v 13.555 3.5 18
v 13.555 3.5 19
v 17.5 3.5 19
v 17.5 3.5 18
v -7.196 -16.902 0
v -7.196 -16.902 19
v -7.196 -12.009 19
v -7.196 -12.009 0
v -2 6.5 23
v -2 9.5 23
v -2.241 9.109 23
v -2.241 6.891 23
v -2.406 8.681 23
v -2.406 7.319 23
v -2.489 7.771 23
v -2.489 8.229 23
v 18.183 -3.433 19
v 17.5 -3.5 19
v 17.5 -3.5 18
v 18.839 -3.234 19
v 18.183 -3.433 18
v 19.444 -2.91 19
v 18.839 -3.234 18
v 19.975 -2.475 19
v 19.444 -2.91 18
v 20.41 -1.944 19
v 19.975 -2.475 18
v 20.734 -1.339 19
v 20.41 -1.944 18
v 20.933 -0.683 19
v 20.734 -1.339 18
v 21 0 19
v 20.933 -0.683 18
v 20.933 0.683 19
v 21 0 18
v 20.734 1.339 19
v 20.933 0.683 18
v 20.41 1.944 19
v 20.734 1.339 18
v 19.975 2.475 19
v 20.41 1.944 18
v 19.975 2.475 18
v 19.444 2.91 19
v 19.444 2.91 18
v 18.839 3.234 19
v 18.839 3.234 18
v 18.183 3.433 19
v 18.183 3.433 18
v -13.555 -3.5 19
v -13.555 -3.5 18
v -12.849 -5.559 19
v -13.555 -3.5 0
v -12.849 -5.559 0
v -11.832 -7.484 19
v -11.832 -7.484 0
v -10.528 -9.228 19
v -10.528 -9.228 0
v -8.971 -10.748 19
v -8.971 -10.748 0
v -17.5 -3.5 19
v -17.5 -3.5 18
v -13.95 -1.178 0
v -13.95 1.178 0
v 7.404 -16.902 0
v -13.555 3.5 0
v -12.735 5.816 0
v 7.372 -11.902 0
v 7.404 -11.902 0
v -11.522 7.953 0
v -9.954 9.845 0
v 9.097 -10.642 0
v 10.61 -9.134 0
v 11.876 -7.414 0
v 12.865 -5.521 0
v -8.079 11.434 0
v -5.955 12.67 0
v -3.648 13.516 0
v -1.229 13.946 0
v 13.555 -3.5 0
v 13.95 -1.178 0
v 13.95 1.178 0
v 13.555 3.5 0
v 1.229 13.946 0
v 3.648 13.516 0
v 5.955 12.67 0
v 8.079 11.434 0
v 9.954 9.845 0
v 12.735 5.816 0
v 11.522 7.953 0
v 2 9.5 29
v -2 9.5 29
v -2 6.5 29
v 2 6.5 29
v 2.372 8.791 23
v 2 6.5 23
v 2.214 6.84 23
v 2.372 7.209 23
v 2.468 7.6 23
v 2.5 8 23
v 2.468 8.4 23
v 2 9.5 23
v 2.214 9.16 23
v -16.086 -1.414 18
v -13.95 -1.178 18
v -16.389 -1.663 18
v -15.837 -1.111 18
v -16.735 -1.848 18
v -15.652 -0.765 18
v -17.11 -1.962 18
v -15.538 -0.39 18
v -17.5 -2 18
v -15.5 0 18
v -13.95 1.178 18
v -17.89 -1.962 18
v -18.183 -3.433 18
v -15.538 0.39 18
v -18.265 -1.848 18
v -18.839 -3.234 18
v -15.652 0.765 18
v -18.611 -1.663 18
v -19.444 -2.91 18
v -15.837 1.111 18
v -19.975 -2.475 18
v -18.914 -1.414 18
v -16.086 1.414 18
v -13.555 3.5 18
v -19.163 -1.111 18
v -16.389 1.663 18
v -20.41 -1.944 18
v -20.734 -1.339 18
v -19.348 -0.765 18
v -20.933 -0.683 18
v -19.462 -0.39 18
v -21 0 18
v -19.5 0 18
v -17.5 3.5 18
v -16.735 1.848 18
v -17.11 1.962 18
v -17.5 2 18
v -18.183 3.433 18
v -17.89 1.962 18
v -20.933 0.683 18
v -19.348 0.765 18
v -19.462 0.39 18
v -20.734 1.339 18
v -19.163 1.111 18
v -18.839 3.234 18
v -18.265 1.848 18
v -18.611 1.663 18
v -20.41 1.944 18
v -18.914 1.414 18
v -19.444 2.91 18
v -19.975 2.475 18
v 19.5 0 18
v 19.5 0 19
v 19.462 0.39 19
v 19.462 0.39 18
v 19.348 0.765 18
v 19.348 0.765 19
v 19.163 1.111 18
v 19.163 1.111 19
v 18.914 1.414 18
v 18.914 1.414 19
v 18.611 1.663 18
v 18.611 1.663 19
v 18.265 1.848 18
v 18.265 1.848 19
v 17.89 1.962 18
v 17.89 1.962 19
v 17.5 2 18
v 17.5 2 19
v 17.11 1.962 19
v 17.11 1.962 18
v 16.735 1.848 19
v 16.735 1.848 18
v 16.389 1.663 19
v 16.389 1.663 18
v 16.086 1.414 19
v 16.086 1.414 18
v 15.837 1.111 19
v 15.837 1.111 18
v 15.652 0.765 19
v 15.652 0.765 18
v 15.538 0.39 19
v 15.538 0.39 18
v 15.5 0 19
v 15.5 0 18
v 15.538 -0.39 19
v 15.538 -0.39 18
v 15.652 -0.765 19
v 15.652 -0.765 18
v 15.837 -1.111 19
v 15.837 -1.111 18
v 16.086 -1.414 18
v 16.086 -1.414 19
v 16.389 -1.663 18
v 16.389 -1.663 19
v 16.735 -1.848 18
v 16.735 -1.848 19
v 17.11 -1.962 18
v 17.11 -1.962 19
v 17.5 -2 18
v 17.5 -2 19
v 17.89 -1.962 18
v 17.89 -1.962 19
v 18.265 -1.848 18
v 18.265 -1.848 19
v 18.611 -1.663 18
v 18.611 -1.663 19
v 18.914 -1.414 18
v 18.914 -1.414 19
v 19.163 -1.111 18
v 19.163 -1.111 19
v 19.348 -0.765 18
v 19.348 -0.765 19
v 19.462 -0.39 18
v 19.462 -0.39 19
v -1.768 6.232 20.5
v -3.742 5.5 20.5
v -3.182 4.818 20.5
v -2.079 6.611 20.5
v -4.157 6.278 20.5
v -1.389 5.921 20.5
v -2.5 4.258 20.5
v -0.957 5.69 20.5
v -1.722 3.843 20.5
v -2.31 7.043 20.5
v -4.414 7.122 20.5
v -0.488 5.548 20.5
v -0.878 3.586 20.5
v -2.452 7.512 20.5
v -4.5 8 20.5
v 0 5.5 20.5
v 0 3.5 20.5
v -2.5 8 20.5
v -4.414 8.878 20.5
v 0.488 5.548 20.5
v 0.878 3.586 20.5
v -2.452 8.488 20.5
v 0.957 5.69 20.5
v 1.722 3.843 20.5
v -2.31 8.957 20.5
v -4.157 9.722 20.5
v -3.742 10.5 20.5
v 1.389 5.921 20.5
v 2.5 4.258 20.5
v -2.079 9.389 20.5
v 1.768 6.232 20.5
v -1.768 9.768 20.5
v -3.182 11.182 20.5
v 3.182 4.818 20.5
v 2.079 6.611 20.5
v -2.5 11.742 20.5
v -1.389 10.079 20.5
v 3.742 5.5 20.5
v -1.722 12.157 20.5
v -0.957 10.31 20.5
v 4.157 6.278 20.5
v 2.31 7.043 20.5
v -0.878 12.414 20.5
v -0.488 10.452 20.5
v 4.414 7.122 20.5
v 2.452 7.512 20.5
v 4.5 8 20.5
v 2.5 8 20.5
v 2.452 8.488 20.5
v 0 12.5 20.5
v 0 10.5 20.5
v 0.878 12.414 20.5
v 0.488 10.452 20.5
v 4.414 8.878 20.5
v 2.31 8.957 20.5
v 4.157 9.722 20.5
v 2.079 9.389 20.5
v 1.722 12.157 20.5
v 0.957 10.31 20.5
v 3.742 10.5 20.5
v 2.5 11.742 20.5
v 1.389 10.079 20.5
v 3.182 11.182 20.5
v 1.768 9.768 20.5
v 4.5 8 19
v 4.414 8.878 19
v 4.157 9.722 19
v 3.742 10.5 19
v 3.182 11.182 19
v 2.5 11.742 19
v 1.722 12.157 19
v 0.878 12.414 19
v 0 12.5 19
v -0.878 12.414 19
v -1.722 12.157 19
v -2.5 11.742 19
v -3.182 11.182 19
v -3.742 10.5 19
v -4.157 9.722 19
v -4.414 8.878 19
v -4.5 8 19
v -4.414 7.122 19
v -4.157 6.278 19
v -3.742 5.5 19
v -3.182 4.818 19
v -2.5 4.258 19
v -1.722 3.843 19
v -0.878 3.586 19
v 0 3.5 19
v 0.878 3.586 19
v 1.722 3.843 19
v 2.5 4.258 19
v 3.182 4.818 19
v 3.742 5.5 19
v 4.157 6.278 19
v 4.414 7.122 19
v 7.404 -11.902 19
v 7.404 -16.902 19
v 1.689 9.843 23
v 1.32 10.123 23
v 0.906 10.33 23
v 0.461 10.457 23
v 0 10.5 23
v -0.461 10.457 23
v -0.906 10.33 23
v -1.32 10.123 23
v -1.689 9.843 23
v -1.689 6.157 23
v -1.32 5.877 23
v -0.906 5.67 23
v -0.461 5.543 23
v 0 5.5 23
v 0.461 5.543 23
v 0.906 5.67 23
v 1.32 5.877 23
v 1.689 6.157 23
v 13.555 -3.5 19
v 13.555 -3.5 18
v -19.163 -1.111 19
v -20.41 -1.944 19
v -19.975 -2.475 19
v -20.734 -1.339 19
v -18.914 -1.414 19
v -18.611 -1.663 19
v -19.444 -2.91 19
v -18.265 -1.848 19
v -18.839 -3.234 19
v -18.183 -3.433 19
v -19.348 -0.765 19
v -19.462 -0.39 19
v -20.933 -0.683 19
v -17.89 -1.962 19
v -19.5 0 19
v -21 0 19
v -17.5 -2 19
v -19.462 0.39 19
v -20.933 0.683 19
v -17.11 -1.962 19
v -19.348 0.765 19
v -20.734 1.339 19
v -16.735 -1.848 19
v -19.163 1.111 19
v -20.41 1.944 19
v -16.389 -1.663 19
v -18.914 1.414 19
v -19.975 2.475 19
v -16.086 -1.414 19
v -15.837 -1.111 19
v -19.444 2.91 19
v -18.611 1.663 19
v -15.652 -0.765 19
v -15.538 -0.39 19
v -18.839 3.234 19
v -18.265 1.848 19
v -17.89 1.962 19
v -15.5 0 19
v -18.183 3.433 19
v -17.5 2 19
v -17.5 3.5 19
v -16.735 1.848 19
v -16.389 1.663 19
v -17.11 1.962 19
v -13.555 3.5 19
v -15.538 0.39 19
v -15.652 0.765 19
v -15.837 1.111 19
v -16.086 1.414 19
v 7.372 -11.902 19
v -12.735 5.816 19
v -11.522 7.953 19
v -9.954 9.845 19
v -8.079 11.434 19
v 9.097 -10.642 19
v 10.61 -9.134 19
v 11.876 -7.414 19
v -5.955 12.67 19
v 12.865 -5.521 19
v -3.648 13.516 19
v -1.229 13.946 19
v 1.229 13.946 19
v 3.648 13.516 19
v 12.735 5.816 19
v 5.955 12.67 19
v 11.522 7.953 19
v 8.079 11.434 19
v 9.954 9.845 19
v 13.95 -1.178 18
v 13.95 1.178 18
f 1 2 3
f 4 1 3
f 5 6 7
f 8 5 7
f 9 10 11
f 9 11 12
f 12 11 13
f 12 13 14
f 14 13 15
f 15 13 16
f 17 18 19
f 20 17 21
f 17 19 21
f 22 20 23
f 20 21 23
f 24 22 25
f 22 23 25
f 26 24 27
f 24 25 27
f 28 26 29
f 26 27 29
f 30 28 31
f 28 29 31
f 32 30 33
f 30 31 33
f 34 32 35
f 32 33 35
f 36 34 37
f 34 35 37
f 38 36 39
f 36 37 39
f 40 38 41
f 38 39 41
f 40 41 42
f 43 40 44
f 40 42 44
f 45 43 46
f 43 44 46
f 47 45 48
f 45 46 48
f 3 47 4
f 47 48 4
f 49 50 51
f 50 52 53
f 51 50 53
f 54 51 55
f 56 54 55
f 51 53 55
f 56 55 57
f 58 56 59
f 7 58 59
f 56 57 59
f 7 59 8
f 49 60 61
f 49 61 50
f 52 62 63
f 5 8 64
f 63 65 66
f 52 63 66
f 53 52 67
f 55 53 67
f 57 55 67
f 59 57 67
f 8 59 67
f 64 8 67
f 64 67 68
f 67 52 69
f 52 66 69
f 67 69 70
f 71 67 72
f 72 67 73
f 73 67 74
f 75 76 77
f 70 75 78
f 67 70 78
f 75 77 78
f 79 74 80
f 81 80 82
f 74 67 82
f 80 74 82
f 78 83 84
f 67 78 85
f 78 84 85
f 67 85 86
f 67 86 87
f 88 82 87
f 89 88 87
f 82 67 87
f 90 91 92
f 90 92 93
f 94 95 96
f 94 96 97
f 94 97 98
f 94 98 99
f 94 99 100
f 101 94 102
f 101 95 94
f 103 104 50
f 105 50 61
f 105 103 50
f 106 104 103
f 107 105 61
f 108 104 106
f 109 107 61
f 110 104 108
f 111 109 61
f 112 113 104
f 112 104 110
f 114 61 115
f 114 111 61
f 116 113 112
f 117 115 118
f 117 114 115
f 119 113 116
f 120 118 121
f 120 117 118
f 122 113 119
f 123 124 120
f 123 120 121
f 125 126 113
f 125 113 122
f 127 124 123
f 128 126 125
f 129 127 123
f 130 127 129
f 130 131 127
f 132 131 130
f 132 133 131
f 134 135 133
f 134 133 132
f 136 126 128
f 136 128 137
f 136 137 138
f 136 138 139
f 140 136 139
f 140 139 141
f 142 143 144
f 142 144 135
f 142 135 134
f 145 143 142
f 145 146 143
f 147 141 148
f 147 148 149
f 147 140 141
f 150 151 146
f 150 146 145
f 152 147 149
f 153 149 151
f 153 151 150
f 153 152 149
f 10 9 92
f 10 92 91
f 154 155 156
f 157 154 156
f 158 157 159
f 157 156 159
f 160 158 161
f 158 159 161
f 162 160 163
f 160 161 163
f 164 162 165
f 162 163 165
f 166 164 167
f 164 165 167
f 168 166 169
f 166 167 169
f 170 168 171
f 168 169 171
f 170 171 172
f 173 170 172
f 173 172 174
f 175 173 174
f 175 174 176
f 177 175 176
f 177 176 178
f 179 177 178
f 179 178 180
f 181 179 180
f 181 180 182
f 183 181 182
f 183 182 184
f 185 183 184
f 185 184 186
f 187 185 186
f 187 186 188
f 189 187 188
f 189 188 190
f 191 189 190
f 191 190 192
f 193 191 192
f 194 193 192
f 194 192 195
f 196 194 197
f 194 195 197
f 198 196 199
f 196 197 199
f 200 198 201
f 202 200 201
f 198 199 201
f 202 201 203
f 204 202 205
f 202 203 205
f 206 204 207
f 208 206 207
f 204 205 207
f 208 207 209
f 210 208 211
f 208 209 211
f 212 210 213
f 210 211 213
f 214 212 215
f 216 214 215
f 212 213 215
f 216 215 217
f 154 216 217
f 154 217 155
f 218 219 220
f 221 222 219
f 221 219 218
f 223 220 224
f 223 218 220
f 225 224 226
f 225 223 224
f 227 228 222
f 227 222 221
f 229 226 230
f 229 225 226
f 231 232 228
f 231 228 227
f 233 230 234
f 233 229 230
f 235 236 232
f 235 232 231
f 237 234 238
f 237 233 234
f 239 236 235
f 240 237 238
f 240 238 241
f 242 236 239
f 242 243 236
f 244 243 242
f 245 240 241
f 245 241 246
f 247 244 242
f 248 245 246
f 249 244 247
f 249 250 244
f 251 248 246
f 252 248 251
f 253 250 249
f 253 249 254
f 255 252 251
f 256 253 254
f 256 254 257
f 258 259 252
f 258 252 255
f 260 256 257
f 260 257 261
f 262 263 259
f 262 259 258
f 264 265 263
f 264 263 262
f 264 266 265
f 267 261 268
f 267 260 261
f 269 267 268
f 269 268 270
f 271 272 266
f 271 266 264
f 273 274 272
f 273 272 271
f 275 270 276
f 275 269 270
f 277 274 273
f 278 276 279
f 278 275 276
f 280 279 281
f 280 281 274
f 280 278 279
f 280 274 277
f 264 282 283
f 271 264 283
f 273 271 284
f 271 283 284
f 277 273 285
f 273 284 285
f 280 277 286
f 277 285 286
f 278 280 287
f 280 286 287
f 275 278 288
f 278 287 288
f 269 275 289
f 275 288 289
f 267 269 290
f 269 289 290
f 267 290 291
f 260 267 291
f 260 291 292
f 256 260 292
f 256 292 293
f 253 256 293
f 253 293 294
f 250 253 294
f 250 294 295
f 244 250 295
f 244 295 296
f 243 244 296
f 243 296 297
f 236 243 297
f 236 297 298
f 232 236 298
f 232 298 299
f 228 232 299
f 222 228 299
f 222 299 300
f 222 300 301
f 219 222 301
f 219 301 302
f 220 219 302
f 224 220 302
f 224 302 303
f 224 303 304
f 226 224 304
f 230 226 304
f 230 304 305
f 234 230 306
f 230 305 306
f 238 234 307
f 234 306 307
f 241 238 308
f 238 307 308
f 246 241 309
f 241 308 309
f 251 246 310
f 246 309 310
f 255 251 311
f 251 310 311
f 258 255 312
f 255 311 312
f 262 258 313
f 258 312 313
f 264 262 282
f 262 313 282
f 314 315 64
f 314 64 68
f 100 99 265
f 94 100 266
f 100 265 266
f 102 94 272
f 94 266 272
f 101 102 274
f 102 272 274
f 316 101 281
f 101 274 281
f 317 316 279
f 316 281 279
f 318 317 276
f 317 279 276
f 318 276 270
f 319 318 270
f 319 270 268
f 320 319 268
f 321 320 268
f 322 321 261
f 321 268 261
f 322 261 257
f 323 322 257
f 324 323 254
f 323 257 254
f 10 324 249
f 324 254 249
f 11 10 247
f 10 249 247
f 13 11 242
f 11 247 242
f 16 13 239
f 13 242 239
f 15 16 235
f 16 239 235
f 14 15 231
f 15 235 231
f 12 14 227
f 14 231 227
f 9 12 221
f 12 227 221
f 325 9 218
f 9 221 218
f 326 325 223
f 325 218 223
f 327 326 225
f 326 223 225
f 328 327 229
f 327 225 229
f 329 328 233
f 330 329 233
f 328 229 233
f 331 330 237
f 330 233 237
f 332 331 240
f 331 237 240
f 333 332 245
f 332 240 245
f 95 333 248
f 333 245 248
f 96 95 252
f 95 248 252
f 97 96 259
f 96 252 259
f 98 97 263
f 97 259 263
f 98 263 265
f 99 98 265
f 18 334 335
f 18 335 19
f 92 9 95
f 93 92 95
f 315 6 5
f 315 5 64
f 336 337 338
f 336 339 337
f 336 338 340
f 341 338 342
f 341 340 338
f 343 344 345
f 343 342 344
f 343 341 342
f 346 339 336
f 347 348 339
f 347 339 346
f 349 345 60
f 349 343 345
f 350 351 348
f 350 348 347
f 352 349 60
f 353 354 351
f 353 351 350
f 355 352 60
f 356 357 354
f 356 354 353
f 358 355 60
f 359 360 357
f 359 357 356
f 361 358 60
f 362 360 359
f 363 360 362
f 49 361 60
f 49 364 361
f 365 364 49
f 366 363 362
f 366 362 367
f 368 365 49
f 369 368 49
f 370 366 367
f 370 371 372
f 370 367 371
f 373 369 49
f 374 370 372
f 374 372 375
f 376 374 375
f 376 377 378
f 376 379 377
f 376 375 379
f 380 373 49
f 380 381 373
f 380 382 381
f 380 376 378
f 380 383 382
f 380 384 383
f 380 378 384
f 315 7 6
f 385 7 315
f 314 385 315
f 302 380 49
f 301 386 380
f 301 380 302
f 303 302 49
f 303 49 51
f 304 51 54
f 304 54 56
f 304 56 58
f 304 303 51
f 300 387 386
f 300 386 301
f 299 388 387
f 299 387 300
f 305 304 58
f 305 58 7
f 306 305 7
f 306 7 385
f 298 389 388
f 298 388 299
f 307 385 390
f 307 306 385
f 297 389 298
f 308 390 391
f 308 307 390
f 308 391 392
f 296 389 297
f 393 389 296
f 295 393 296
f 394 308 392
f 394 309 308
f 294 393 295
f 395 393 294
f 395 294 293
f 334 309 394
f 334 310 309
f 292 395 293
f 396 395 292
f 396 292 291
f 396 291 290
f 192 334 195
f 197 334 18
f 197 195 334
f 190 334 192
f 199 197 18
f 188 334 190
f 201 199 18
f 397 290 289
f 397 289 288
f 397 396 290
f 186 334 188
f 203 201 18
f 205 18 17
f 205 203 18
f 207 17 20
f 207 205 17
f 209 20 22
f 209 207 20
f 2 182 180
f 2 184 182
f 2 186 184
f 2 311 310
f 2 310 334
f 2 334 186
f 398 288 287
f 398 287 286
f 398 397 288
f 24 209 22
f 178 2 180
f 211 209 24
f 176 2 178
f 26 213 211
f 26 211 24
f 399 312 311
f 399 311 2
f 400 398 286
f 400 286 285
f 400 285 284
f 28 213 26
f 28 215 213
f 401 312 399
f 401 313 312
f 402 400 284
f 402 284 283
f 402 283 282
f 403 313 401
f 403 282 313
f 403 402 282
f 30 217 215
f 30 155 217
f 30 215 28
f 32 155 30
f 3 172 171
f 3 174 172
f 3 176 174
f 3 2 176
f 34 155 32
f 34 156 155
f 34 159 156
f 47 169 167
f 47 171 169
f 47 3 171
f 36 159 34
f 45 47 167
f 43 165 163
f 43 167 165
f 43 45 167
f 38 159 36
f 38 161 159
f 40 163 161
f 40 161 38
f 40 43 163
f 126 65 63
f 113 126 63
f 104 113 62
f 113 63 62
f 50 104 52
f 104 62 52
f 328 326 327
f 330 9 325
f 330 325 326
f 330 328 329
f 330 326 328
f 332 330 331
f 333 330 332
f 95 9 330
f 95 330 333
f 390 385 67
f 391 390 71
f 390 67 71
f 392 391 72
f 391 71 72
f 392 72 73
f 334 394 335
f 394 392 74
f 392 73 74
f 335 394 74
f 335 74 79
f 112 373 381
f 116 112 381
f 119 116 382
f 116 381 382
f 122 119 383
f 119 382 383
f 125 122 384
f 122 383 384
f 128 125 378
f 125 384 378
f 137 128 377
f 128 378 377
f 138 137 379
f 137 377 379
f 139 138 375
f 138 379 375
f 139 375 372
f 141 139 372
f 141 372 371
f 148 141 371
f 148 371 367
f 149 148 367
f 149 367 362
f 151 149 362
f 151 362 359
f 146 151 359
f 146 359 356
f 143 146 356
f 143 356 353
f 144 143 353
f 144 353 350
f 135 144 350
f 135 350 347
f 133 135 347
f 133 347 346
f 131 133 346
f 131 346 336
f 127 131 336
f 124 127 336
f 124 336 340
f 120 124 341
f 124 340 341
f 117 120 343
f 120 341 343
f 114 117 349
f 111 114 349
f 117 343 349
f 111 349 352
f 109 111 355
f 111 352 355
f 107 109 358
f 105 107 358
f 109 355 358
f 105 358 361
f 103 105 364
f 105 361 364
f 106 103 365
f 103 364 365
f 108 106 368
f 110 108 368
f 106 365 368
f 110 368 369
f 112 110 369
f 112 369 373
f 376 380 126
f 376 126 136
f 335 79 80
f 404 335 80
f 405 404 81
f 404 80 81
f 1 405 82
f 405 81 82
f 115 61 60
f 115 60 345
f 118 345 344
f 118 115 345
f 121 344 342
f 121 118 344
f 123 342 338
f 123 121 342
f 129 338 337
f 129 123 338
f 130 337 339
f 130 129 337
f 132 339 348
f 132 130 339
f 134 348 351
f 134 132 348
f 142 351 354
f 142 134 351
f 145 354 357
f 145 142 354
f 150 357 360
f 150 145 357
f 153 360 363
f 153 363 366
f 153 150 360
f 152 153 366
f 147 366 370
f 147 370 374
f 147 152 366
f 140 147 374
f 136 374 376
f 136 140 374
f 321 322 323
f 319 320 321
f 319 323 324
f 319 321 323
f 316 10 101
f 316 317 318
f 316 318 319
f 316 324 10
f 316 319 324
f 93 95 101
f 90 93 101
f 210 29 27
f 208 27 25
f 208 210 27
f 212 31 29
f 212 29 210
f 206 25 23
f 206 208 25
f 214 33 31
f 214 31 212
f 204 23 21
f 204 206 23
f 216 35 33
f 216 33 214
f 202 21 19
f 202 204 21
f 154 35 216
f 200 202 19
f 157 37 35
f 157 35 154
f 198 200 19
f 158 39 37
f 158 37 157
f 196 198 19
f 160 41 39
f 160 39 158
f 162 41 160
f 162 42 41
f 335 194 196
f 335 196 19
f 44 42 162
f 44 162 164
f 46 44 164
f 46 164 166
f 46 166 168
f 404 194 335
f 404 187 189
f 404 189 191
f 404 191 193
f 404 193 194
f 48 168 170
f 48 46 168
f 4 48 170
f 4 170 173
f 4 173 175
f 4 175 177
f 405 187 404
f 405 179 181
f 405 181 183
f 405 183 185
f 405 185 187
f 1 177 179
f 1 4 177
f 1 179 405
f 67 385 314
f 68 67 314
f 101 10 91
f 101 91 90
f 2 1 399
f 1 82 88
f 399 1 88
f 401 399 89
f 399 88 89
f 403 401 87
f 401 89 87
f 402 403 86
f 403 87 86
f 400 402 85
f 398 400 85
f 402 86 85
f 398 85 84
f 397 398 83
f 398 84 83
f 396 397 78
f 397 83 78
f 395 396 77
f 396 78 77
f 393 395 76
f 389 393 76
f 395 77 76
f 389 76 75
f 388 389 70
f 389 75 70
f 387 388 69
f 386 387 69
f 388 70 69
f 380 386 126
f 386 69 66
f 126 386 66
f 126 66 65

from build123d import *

# Parameters (mm, degrees)
ESBO_O2_R                = 14
RESSALTO_EXTRUS_O2_DEPTH = 19
ESBO_O3_W                = 14.6
ESBO_O3_H                = 5
RESSALTO_EXTRUS_O3_DEPTH = 19
ESBO_O4_W                = 10
ESBO_O4_H                = 7
RESSALTO_EXTRUS_O4_DEPTH = 19
RESSALTO_EXTRUS_O5_DEPTH = 19
ESBO_O6_R                = 2
CORTE_EXTRUS_O1_DEPTH    = 35.551542095
CORTE_EXTRUS_O2_DEPTH    = 35.551542095
CORTE_EXTRUS_O3_DEPTH    = 35.551542095
ESBO_O9_R                = 4.5
RESSALTO_EXTRUS_O7_DEPTH = 20.5
ESBO_O10_R               = 2.5
RESSALTO_EXTRUS_O8_DEPTH = 2.5
ESBO_O11_W               = 4
ESBO_O11_H               = 3
RESSALTO_EXTRUS_O9_DEPTH = 29
CORTE_EXTRUS_O4_DEPTH    = 18
CORTE_EXTRUS_O5_DEPTH    = 18


with BuildPart() as part:
    # Esboço2 → Ressalto-extrusão2 (new body)
    with BuildSketch(Plane.XY):
        Circle(ESBO_O2_R)
    extrude(amount=RESSALTO_EXTRUS_O2_DEPTH)

    # Esboço3 → Ressalto-extrusão3 (add)
    with BuildSketch(Plane.XY.offset(19)):
        with Locations((0.104281732, -14.40160663)):
            Rectangle(ESBO_O3_W, ESBO_O3_H)
    extrude(amount=-RESSALTO_EXTRUS_O3_DEPTH)

    # Esboço4 → Ressalto-extrusão4 (add)
    with BuildSketch(Plane.XY.offset(19)):
        with Locations((18.39112555, 0)):
            Rectangle(ESBO_O4_W, ESBO_O4_H)
    extrude(amount=-RESSALTO_EXTRUS_O4_DEPTH)

    # Esboço5 → Ressalto-extrusão5 (add)
    with BuildSketch(Plane.XY.offset(19)):
        Polygon((-13.354036811, 3.5), (-23.354036811, 3.5), (-23.354036811, -3.5), (-13.354036811, -3.5), (-13.354036811, 0), align=None)
    extrude(amount=-RESSALTO_EXTRUS_O5_DEPTH)

    # Esboço6 → Corte-extrusão1 (cut, through all)
    with BuildSketch(Plane.XY.offset(19)):
        with Locations((-17.5, 0)):
            Circle(ESBO_O6_R)
        with Locations((17.5, 0)):
            Circle(ESBO_O6_R)
    extrude(amount=-CORTE_EXTRUS_O1_DEPTH, mode=Mode.SUBTRACT)

    # Esboço7 → Corte-extrusão2 (cut, through all)
    with BuildSketch(Plane.XY):
        with BuildLine():
            Line((-17.5, 3.5), (-23.354036811, 3.5))
            Line((-23.354036811, 3.5), (-23.354036811, -3.5))
            Line((-23.354036811, -3.5), (-17.5, -3.5))
            ThreePointArc((-17.5, -3.5), (-21, 0), (-17.5, 3.5))
        make_face()
    extrude(amount=CORTE_EXTRUS_O2_DEPTH, mode=Mode.SUBTRACT)

    # Esboço8 → Corte-extrusão3 (cut, through all)
    with BuildSketch(Plane.XY):
        with BuildLine():
            Line((17.5, 3.5), (23.39112555, 3.5))
            Line((23.39112555, 3.5), (23.39112555, -3.5))
            Line((23.39112555, -3.5), (17.5, -3.5))
            ThreePointArc((17.5, -3.5), (21, 0), (17.5, 3.5))
        make_face()
    extrude(amount=CORTE_EXTRUS_O3_DEPTH, mode=Mode.SUBTRACT)

    # Esboço9 → Ressalto-extrusão7 (add)
    with BuildSketch(Plane.XY):
        with Locations((0, 8)):
            Circle(ESBO_O9_R)
    extrude(amount=RESSALTO_EXTRUS_O7_DEPTH)

    # Esboço10 → Ressalto-extrusão8 (add)
    with BuildSketch(Plane.XY.offset(20.5)):
        with Locations((0, 8)):
            Circle(ESBO_O10_R)
    extrude(amount=RESSALTO_EXTRUS_O8_DEPTH)

    # Esboço11 → Ressalto-extrusão9 (add)
    with BuildSketch(Plane.XY):
        with Locations((0, 8)):
            Rectangle(ESBO_O11_W, ESBO_O11_H)
    extrude(amount=RESSALTO_EXTRUS_O9_DEPTH)

    # Esboço12 → Corte-extrusão4 (cut)
    with BuildSketch(Plane(origin=(0, 0, 0), x_dir=(-1, 0, 0), z_dir=(0, 0, -1))):
        with BuildLine():
            Line((-17.5, -3.5), (-13.555441712, -3.5))
            ThreePointArc((-13.555441712, -3.5), (-14, 0), (-13.555441712, 3.5))
            Line((-13.555441712, 3.5), (-17.5, 3.5))
            ThreePointArc((-17.5, 3.5), (-21, 0), (-17.5, -3.5))
        make_face()
    extrude(amount=-CORTE_EXTRUS_O4_DEPTH, mode=Mode.SUBTRACT)

    # Esboço13 → Corte-extrusão5 (cut)
    with BuildSketch(Plane(origin=(0, 0, 0), x_dir=(-1, 0, 0), z_dir=(0, 0, -1))):
        with BuildLine():
            Line((13.555441712, -3.5), (17.5, -3.5))
            ThreePointArc((17.5, -3.5), (21, 0), (17.5, 3.5))
            Line((17.5, 3.5), (13.555441712, 3.5))
            ThreePointArc((13.555441712, 3.5), (14, 0), (13.555441712, -3.5))
        make_face()
    extrude(amount=-CORTE_EXTRUS_O5_DEPTH, mode=Mode.SUBTRACT)


solid = part.part
